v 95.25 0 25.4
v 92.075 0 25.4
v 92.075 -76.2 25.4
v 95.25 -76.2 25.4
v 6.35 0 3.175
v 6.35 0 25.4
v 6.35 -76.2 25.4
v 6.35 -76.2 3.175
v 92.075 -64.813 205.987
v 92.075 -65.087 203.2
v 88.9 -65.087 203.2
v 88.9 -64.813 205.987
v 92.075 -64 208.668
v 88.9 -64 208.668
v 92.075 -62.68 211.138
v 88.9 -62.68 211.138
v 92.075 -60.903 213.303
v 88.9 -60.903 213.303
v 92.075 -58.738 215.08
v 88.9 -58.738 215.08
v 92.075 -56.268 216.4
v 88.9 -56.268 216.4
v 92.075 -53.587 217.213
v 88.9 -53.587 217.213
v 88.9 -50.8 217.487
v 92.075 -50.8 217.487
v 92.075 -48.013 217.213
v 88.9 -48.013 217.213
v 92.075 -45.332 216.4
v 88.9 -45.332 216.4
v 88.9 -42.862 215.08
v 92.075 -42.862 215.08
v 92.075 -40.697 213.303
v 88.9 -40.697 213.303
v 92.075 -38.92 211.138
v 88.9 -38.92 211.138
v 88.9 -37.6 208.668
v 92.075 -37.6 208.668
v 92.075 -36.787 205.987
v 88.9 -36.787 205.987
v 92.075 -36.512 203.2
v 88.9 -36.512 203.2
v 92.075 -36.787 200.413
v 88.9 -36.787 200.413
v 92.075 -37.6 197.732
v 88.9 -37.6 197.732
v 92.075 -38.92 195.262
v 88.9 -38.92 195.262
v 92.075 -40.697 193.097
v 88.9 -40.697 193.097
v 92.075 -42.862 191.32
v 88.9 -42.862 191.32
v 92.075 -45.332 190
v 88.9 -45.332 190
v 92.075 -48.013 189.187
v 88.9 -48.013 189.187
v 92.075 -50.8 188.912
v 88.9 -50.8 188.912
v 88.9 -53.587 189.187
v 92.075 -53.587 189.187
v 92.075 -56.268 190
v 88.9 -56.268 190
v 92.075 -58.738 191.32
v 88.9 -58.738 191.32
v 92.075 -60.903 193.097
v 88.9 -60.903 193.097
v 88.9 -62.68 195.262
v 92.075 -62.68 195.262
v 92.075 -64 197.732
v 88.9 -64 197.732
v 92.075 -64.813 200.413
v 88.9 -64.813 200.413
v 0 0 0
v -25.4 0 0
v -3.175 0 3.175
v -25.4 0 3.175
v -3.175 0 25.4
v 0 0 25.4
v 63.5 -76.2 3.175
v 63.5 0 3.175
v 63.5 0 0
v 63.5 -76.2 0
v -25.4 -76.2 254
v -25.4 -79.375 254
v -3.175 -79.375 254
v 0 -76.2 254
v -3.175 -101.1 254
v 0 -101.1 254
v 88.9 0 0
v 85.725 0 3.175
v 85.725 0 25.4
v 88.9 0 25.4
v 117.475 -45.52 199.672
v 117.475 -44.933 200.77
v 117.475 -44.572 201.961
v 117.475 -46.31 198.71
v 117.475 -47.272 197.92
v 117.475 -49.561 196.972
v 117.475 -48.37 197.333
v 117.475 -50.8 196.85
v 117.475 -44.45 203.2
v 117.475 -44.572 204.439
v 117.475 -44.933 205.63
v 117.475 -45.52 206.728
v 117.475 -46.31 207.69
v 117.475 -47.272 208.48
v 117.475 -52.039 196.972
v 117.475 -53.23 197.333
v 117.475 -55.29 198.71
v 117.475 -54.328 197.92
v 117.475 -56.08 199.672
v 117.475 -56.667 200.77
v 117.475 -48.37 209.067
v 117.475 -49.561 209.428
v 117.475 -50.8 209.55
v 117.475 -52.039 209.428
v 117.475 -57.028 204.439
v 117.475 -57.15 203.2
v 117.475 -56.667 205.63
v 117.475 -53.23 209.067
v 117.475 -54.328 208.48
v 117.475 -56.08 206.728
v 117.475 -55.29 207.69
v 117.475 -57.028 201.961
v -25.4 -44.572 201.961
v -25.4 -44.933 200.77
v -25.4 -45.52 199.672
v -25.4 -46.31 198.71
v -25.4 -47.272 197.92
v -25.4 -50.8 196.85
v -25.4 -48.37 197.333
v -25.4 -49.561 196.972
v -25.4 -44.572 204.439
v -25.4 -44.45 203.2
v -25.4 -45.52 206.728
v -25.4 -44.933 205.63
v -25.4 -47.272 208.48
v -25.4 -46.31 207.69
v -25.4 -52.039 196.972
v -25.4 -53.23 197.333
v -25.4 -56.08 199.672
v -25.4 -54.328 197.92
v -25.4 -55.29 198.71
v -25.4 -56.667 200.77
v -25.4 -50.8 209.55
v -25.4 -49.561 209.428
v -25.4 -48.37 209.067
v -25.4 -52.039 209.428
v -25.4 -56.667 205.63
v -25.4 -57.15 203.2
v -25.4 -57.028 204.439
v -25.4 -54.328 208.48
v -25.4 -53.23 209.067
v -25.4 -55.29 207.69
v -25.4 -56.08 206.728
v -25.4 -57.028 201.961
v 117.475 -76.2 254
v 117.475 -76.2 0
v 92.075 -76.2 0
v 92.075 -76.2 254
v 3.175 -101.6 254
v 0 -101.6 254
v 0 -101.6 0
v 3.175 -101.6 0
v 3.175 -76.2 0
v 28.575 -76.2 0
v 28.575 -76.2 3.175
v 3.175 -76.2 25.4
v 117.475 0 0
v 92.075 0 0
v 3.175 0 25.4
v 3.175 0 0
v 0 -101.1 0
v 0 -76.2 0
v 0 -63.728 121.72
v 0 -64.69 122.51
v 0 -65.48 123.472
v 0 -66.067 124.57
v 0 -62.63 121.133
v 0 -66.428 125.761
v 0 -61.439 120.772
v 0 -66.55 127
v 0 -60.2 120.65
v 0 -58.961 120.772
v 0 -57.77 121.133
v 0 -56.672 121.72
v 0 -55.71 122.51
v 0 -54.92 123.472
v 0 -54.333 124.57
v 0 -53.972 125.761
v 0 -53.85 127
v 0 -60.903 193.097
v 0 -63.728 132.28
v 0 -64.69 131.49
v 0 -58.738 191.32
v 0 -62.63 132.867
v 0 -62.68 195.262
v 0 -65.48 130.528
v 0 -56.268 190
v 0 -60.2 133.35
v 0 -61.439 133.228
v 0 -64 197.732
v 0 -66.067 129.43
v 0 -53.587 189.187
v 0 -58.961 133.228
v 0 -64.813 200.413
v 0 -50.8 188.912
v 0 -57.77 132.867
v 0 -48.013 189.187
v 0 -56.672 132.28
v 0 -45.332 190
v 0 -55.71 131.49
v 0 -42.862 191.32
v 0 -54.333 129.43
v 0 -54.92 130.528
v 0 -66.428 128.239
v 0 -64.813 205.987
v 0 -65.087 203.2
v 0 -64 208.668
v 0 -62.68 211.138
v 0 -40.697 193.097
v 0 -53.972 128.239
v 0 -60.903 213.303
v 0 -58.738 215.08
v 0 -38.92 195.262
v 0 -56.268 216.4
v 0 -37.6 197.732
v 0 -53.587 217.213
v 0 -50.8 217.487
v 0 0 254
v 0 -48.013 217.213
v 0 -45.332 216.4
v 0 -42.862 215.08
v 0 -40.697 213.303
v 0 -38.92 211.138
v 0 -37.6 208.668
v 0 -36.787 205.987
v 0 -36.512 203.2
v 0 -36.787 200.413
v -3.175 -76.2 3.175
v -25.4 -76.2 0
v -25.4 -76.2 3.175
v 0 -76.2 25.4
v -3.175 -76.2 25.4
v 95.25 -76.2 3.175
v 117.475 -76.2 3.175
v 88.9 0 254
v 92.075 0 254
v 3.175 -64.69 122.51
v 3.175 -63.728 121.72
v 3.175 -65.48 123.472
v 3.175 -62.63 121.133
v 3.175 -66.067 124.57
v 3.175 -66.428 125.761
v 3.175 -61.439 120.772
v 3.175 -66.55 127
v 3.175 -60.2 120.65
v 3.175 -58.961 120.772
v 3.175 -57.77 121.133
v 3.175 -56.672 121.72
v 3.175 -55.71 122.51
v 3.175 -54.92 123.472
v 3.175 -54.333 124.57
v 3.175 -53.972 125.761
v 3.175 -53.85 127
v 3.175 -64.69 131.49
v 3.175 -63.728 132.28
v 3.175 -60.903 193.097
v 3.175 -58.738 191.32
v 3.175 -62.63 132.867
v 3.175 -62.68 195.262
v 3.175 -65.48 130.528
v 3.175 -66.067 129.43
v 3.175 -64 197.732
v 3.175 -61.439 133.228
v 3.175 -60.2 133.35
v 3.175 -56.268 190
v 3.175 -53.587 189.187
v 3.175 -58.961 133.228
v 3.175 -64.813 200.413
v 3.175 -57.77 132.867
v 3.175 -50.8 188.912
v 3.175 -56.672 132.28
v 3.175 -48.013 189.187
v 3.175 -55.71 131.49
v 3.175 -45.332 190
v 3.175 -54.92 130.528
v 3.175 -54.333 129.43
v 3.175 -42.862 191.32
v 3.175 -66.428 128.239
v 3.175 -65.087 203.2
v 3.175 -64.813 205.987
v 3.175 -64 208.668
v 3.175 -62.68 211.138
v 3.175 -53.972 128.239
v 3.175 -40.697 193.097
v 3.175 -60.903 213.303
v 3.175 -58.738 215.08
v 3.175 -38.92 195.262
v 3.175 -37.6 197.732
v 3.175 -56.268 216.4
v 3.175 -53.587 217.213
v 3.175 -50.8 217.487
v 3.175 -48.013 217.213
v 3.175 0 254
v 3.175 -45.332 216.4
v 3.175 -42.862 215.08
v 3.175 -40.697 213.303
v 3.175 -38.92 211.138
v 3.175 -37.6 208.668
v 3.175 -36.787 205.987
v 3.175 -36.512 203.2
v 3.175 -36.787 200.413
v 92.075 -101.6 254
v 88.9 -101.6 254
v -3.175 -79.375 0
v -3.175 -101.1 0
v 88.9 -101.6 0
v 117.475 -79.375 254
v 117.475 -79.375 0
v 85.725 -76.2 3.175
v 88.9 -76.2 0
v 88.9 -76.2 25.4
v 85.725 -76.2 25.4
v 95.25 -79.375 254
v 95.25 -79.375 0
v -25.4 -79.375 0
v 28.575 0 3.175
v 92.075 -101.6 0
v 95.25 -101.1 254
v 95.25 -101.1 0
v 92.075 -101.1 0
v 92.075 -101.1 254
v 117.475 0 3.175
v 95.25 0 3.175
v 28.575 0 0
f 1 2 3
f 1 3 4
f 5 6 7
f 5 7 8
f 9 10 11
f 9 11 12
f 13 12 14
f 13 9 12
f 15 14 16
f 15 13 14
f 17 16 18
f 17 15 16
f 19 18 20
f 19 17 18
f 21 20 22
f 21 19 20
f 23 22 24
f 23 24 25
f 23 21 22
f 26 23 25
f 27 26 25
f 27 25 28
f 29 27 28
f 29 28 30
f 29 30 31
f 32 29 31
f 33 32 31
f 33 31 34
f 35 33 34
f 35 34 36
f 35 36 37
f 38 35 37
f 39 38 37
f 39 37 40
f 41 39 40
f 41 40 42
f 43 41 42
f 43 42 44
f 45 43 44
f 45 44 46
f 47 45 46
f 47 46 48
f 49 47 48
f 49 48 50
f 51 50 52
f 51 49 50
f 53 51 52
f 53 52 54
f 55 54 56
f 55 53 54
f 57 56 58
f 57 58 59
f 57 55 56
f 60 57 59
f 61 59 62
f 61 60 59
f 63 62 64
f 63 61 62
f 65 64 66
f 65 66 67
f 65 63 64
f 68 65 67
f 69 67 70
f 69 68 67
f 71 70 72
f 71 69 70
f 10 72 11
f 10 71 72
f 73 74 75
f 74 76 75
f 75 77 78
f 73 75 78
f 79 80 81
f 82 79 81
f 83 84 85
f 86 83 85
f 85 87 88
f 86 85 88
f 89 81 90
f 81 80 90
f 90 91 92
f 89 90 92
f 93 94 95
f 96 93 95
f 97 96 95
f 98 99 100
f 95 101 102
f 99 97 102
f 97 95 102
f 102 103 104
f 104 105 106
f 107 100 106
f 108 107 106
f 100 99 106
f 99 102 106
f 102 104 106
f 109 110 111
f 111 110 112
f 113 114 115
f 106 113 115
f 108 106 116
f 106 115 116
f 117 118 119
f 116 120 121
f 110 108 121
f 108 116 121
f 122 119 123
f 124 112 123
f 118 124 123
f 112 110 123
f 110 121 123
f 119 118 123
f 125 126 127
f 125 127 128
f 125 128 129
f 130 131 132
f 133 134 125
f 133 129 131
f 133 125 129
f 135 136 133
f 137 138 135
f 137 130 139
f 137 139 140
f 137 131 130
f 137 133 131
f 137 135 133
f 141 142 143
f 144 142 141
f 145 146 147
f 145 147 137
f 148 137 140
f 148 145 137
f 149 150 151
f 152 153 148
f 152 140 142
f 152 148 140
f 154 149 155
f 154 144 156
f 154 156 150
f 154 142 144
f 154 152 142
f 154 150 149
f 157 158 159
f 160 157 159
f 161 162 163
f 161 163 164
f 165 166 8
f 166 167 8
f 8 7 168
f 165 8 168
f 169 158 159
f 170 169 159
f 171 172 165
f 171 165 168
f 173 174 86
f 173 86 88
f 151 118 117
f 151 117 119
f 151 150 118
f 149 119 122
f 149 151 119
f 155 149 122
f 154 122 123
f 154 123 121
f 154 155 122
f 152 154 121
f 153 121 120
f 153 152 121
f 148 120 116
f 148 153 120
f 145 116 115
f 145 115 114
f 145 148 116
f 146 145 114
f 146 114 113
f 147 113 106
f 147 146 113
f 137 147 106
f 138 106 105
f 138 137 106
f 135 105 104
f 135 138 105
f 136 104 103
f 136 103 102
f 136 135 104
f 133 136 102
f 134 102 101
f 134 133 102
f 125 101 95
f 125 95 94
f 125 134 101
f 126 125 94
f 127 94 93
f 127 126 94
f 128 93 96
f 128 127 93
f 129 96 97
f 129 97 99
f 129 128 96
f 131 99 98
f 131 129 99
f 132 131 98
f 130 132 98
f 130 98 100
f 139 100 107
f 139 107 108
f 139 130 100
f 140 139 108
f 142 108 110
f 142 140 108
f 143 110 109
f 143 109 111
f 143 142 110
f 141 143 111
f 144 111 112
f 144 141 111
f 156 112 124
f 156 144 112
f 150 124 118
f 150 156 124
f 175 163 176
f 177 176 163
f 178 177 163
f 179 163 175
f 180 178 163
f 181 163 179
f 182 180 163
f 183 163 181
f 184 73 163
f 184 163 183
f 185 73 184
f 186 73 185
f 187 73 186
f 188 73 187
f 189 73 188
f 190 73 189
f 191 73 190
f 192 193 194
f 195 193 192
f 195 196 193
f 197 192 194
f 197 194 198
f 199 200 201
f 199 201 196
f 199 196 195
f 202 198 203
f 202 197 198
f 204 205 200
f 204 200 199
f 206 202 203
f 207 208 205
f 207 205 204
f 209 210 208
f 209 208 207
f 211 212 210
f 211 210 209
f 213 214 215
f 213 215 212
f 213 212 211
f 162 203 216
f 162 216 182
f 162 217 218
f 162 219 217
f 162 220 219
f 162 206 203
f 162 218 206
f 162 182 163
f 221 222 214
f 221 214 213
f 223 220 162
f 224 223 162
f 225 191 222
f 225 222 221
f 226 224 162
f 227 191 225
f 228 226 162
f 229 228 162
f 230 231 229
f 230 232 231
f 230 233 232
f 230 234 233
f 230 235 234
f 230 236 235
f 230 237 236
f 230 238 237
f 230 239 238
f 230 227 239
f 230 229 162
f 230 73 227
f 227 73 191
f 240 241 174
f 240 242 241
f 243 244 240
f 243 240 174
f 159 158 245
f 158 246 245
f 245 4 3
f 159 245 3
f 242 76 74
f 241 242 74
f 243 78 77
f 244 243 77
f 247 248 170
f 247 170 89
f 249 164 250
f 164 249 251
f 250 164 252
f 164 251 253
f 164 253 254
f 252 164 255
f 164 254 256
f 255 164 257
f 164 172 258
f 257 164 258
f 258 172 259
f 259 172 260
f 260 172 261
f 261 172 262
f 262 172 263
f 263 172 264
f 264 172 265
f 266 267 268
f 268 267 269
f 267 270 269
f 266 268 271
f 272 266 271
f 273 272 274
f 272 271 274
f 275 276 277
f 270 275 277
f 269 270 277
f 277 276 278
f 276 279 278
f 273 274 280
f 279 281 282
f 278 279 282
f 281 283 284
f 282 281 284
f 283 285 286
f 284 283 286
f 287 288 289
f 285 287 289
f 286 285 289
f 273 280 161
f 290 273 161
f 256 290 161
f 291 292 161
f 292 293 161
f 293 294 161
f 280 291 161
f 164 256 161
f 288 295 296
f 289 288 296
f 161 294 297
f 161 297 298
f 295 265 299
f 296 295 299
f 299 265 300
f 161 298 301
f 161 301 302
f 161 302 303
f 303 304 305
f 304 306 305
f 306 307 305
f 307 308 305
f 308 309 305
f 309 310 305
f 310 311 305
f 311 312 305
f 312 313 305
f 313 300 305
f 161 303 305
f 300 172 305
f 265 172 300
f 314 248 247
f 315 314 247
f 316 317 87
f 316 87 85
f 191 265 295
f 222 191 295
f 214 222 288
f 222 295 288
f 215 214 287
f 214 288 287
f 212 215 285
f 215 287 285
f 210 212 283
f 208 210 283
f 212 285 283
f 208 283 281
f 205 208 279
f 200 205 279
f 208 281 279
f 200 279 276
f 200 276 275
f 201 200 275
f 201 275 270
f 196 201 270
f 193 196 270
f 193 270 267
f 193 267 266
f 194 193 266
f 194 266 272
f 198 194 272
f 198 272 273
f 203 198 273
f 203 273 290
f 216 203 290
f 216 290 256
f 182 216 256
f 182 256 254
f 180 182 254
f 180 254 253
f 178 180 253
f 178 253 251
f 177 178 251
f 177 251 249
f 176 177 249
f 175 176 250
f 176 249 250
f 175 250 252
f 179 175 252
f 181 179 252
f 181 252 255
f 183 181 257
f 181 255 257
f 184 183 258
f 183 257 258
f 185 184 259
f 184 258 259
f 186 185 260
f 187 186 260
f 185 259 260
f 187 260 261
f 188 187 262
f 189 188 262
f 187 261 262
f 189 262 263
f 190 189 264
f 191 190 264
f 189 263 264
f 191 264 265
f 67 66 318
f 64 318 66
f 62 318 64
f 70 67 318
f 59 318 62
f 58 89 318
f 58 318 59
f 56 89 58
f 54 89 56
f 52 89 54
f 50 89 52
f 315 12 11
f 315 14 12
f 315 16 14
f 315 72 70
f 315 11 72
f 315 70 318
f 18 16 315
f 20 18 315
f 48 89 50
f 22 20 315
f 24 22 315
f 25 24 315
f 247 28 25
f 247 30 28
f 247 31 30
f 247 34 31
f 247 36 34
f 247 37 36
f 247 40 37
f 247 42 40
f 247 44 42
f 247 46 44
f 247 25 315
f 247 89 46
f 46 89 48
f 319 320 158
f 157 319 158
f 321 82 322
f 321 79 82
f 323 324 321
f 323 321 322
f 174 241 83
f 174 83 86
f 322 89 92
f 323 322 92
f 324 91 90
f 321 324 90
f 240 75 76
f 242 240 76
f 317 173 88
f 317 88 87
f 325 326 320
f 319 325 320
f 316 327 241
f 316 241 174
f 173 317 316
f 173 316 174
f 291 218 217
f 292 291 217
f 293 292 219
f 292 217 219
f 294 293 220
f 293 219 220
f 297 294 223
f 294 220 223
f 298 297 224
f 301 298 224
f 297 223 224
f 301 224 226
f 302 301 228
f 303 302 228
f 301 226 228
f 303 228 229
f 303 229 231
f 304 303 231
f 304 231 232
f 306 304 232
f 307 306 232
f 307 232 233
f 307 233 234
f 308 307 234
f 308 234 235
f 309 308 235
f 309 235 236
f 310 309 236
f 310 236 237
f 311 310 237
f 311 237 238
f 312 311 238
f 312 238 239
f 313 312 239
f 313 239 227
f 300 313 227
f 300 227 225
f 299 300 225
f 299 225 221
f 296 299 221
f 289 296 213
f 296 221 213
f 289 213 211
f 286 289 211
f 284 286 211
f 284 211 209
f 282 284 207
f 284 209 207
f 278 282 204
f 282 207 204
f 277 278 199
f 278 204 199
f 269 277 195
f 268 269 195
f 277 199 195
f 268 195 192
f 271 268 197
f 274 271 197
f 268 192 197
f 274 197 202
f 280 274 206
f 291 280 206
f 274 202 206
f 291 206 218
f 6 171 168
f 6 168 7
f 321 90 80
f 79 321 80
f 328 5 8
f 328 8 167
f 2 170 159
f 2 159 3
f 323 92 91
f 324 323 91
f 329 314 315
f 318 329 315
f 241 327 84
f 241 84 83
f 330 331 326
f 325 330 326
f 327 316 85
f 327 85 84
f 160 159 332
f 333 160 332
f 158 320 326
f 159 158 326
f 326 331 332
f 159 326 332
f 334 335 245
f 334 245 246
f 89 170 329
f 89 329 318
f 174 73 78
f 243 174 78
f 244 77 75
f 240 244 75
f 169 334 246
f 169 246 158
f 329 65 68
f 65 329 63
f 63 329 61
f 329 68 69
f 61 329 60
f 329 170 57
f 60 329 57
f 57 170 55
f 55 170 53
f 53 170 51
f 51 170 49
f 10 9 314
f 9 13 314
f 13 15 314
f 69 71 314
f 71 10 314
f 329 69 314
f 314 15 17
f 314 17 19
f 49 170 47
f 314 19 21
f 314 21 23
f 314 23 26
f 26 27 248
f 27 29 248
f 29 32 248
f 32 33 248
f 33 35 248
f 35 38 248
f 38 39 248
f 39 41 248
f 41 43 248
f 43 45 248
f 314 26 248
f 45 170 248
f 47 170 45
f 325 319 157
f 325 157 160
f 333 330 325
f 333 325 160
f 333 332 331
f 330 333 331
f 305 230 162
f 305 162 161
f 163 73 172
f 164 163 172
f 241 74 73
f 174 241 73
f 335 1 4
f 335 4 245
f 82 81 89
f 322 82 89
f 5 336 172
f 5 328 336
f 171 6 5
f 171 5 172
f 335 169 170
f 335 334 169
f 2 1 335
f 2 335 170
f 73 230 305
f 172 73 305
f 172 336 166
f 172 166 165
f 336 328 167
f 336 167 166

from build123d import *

# Parameters (mm, degrees)
F1_DEPTH       = 76.2
F2_W           = 3.175
F2_H           = 254
F3_DEPTH       = 101.6
F4_R           = 14.2875
F5_DEPTH       = 25.4
F9_DEPTH       = 254
F12_R          = 6.35
F13_DEPTH      = 25.4
F13_DEPTH_BACK = 117.475
F14_R          = 6.35
F15_DEPTH      = 25.4


with BuildPart() as f1:
    # F0 (on Front) → F1 (new body)
    with BuildSketch(Plane.XZ):
        Polygon((-25.4, 0), (0, 0), (0, 25.4), (-3.175, 25.4), (-3.175, 3.175), (-25.4, 3.175), align=None)
    extrude(amount=F1_DEPTH)


with BuildPart() as f3:
    # F2 (on Front) → F3 (new body)
    with BuildSketch(Plane.XZ):
        with Locations((1.5875, 127)):
            Rectangle(F2_W, F2_H)
    extrude(amount=F3_DEPTH)

    # F4 (on face) → F5 (cut)
    with BuildSketch(Plane(origin=(0, 0, 0), x_dir=(0, -1, 0), z_dir=(-1, 0, 0))):
        with Locations((50.8, 203.2)):
            Circle(F4_R)
    extrude(amount=-F5_DEPTH, mode=Mode.SUBTRACT)


with BuildPart() as f7_1:
    # F7: instance of F1
    add(f1.part.mirror(Plane(origin=(1.5875, -50.8, 125.0581364991), x_dir=(0, -1, 0), z_dir=(-1, 0, 0))))


with BuildPart() as f9:
    # F8 (on face) → F9 (new body)
    with BuildSketch(Plane(origin=(0, 0, 0), x_dir=(1, 0, 0), z_dir=(0, 0, -1))):
        Polygon((-25.4, 79.375), (-25.4, 76.2), (0, 76.2), (0, 101.0998785496), (-3.175, 101.0998785496), (-3.175, 79.375), align=None)
    extrude(amount=-F9_DEPTH)


with BuildPart() as f11_1:
    # F11: instance of F3
    add(f3.part.mirror(Plane(origin=(46.0375, -50.8, 125.0581364991), x_dir=(0, -1, 0), z_dir=(-1, 0, 0))))


with BuildPart() as f11_2:
    # F11: instance of F7_1
    add(f7_1.part.mirror(Plane(origin=(46.0375, -50.8, 125.0581364991), x_dir=(0, -1, 0), z_dir=(-1, 0, 0))))


with BuildPart() as f11_3:
    # F11: instance of F9
    add(f9.part.mirror(Plane(origin=(46.0375, -50.8, 125.0581364991), x_dir=(0, -1, 0), z_dir=(-1, 0, 0))))


with BuildPart() as f11_4:
    # F11: instance of F1
    add(f1.part.mirror(Plane(origin=(46.0375, -50.8, 125.0581364991), x_dir=(0, -1, 0), z_dir=(-1, 0, 0))))


with BuildPart() as f13:
    # F12 (on face) → F13 (new body, two sides)
    with BuildSketch(Plane(origin=(0, 0, 0), x_dir=(0, -1, 0), z_dir=(-1, 0, 0))) as f13_sk:
        with Locations((50.8, 203.2)):
            Circle(F12_R)
    extrude(amount=F13_DEPTH)
    extrude(f13_sk.sketch, amount=-F13_DEPTH_BACK)


with BuildPart() as f3_1:
    add(f3.part)

    # F14 (on face) → F15 (cut)
    with BuildSketch(Plane.YZ.offset(3.175)):
        with Locations((-60.2, 127)):
            Circle(F14_R)
    extrude(amount=-F15_DEPTH, mode=Mode.SUBTRACT)


solid = Compound([f1.part, f7_1.part, f9.part, f11_1.part, f11_2.part, f11_3.part, f11_4.part, f13.part, f3_1.part])
